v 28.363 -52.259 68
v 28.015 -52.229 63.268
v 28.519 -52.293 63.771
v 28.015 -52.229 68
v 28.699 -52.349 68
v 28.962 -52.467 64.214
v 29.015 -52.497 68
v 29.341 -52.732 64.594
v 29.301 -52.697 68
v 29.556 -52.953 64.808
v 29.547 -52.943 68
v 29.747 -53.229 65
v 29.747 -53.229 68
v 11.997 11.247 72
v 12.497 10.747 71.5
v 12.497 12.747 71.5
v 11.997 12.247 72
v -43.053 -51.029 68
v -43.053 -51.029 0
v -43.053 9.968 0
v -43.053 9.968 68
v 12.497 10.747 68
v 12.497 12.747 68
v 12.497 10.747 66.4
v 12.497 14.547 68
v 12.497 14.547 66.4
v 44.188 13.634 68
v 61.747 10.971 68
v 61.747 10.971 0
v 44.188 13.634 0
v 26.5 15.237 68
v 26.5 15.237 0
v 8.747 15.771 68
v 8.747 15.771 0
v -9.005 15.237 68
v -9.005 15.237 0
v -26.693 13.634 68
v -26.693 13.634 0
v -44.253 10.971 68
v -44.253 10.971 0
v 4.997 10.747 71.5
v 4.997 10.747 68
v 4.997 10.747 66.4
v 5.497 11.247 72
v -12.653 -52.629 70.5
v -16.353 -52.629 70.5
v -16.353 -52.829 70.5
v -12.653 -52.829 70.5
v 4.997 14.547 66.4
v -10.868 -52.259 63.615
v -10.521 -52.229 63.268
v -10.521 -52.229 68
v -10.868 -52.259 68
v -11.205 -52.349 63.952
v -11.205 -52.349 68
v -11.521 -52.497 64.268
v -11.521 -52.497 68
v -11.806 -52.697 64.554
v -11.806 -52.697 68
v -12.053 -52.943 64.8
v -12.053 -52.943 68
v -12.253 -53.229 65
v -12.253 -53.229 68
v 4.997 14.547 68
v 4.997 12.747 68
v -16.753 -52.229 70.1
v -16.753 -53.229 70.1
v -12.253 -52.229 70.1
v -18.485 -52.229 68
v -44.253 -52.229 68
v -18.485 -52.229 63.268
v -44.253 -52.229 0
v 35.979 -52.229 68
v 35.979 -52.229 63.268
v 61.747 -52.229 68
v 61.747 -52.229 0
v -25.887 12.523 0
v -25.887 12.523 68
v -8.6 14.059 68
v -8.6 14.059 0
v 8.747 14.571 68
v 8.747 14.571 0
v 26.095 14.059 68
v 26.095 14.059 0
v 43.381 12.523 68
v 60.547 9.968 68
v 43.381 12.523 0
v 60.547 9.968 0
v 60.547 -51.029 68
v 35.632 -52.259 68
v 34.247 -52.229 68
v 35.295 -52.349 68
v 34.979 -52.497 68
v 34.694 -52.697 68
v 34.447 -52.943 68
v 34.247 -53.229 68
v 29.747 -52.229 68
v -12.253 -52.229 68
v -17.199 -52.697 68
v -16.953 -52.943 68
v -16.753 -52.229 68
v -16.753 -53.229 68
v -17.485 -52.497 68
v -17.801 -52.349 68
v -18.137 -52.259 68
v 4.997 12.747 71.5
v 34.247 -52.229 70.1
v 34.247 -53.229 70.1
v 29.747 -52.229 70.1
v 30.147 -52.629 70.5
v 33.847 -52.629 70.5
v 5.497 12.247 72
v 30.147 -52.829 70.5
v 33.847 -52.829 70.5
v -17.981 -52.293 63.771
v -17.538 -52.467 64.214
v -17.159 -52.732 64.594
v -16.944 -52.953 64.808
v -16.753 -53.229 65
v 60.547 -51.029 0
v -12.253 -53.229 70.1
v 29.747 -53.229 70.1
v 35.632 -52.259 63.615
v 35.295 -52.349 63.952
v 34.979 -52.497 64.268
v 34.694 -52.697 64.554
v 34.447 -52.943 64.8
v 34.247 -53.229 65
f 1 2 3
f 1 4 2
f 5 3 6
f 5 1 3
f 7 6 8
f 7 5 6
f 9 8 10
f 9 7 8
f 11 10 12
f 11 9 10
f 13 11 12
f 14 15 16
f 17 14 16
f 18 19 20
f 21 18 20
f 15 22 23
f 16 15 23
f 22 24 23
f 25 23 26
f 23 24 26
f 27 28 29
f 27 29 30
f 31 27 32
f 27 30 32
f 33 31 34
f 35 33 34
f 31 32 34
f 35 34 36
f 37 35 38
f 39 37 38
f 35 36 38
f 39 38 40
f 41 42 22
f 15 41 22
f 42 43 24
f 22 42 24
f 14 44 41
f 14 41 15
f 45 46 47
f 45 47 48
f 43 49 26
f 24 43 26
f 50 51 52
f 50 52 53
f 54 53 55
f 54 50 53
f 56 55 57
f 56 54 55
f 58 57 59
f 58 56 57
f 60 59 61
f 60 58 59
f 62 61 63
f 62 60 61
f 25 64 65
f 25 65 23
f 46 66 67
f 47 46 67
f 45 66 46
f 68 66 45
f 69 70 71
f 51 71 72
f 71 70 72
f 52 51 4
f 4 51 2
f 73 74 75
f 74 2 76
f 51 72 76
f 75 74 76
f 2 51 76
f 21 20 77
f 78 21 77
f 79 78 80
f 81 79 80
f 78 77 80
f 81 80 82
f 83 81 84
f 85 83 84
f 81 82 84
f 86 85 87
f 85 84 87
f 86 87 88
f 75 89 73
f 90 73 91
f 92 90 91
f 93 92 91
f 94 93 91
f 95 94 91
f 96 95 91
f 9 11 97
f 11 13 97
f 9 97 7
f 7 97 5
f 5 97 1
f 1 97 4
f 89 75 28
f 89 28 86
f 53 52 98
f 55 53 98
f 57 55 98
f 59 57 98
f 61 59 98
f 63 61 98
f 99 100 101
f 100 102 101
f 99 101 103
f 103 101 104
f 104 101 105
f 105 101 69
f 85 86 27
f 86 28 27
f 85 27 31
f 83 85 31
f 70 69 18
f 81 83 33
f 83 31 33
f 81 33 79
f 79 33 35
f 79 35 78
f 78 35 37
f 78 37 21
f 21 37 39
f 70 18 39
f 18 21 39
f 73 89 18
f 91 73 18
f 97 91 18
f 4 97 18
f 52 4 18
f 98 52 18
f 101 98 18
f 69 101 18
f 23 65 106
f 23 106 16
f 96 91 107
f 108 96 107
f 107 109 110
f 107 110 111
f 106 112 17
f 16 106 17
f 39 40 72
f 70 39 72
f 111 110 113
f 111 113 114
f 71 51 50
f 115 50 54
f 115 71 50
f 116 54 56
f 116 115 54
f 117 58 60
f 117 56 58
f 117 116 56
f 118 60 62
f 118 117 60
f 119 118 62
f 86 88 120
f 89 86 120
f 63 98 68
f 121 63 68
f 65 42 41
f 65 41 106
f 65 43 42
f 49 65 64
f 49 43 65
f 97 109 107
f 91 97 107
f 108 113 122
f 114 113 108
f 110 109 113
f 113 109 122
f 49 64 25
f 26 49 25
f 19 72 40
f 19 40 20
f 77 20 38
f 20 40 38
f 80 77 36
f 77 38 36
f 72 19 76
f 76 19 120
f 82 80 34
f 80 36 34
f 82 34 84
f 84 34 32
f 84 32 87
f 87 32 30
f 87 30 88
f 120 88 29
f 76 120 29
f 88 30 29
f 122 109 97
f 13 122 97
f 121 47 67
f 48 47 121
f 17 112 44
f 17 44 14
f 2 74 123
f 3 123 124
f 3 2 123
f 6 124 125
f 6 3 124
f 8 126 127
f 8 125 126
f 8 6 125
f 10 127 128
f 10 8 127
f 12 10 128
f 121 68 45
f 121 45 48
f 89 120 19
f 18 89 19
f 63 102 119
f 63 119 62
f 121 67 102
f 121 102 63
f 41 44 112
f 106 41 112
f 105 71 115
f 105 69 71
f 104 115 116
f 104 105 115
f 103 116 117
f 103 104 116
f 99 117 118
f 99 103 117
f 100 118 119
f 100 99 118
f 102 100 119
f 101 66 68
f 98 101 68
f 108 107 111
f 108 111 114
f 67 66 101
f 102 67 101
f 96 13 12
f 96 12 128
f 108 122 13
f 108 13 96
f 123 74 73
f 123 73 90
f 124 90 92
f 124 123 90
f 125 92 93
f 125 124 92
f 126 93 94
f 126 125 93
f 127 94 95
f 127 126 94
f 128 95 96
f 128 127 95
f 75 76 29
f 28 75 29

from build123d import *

# Parameters (mm, degrees)
F1_DEPTH     = 68
F2_W         = 4.5
F2_H         = 2.5
F2_H_2       = 3
F3_DEPTH     = 1
F4_T1_DEPTH  = 3
F4_T3_DEPTH  = 4.5
F4_T5_DEPTH  = 4.5
F4_T11_DEPTH = 7.3301270189
F4_T15_DEPTH = 8.8301270189
F4_T22_DEPTH = 8.8301270189
F4_T26_DEPTH = 7.3301270189
F4_T33_DEPTH = 8.8301270189
F4_T37_DEPTH = 7.3301270189
F4_T44_DEPTH = 7.3301270189
F4_T48_DEPTH = 8.8301270189
F5_W         = 7.5
F5_H         = 3.8003136895
F6_DEPTH     = 1.6
F7_W         = 7.5
F7_H         = 2
F8_DEPTH     = 4
F9_SIZE      = 0.5
F10_SIZE     = 0.4


# Not quite as in the source:
# - a fillet or chamfer that OpenCascade refuses, or shapes differently, is made with other operations: its cross-section is extruded or revolved along the edge and cut away or added


with BuildPart() as f1:
    # F0 (on Top) → F1 (new body)
    with BuildSketch(Plane.XY):
        with BuildLine():
            ThreePointArc((61.7473262101, 10.9707194196), (8.7473262101, 15.7712320468), (-44.2526737899, 10.9707194196))
            Line((-44.2526737899, 10.9707194196), (-44.2526737899, -52.2287679532))
            Line((-44.2526737899, -52.2287679532), (61.7473262101, -52.2287679532))
            Line((61.7473262101, -52.2287679532), (61.7473262101, 10.9707194196))
        make_face()
        with BuildLine():
            ThreePointArc((-43.0526737899, 9.9683154894), (8.7473262101, 14.5712320468), (60.5473262101, 9.9683154894))
            Line((60.5473262101, 9.9683154894), (60.5473262101, -51.0287679532))
            Line((60.5473262101, -51.0287679532), (-43.0526737899, -51.0287679532))
            Line((-43.0526737899, -51.0287679532), (-43.0526737899, 9.9683154894))
        make_face(mode=Mode.SUBTRACT)
    extrude(amount=F1_DEPTH)

    # F2 (on face) → F3 (join)
    with BuildSketch(Plane.XZ.offset(52.2287679532)):
        with Locations((-14.5026737899, 69.25)):
            Rectangle(F2_W, F2_H)
        with Locations((31.9973262101, 69.25)):
            Rectangle(F2_W, F2_H)
        with Locations((-14.5026737899, 66.5)):
            Rectangle(F2_W, F2_H_2)
        with Locations((31.9973262101, 66.5)):
            Rectangle(F2_W, F2_H_2)
    extrude(amount=F3_DEPTH)

    # F4: fillet of radius 2 on 6 edges, made by hand

    # F4_s2 → F4_t1 (join)
    with BuildSketch(Plane.XY.offset(65)):
        with BuildLine():
            ThreePointArc((-10.5206229823, -52.2287679532), (-11.5206229823, -52.4967171456), (-12.2526737899, -53.2287679532))
            Line((-12.2526737899, -53.2287679532), (-12.2526737899, -52.2287679532))
            Line((-12.2526737899, -52.2287679532), (-10.5206229823, -52.2287679532))
        make_face()
        with BuildLine():
            ThreePointArc((-18.4847245974, -52.2287679532), (-17.4847245974, -52.4967171456), (-16.7526737899, -53.2287679532))
            Line((-16.7526737899, -53.2287679532), (-16.7526737899, -52.2287679532))
            Line((-16.7526737899, -52.2287679532), (-18.4847245974, -52.2287679532))
        make_face()
        with BuildLine():
            ThreePointArc((28.0152754026, -52.2287679532), (29.0152754026, -52.4967171456), (29.7473262101, -53.2287679532))
            Line((29.7473262101, -53.2287679532), (29.7473262101, -52.2287679532))
            Line((29.7473262101, -52.2287679532), (28.0152754026, -52.2287679532))
        make_face()
        with BuildLine():
            ThreePointArc((35.9793770177, -52.2287679532), (34.9793770177, -52.4967171456), (34.2473262101, -53.2287679532))
            Line((34.2473262101, -53.2287679532), (34.2473262101, -52.2287679532))
            Line((34.2473262101, -52.2287679532), (35.9793770177, -52.2287679532))
        make_face()
    extrude(amount=F4_T1_DEPTH)

    # F4_s4 → F4_t3 (join)
    with BuildSketch(Plane.YZ.offset(-16.7526737899)):
        with BuildLine():
            ThreePointArc((-52.2287679532, 63.2679491924), (-52.4967171456, 64.2679491924), (-53.2287679532, 65))
            Line((-53.2287679532, 65), (-52.2287679532, 65))
            Line((-52.2287679532, 65), (-52.2287679532, 63.2679491924))
        make_face()
    extrude(amount=F4_T3_DEPTH)

    # F4_s6 → F4_t5 (join)
    with BuildSketch(Plane.YZ.offset(29.7473262101)):
        with BuildLine():
            ThreePointArc((-52.2287679532, 63.2679491924), (-52.4967171456, 64.2679491924), (-53.2287679532, 65))
            Line((-53.2287679532, 65), (-52.2287679532, 65))
            Line((-52.2287679532, 65), (-52.2287679532, 63.2679491924))
        make_face()
    extrude(amount=F4_T5_DEPTH)


with BuildPart() as f4_tool9:
    # F4_s10 → F4_t11 (new body)
    with BuildSketch(Plane.XY.offset(60.6698729811)):
        with BuildLine():
            ThreePointArc((-10.5206229823, -52.2287679532), (-11.5206229823, -52.4967171456), (-12.2526737899, -53.2287679532))
            Line((-12.2526737899, -53.2287679532), (-12.2526737899, -52.2287679532))
            Line((-12.2526737899, -52.2287679532), (-10.5206229823, -52.2287679532))
        make_face()
    extrude(amount=F4_T11_DEPTH)

    split(bisect_by=Plane.XY.offset(65), keep=Keep.BOTTOM)


with BuildPart() as f4_tool13:
    # F4_s14 → F4_t15 (new body)
    with BuildSketch(Plane.YZ.offset(-16.7526737899)):
        with BuildLine():
            ThreePointArc((-52.2287679532, 63.2679491924), (-52.4967171456, 64.2679491924), (-53.2287679532, 65))
            Line((-53.2287679532, 65), (-52.2287679532, 65))
            Line((-52.2287679532, 65), (-52.2287679532, 63.2679491924))
        make_face()
    extrude(amount=F4_T15_DEPTH)

    split(bisect_by=Plane.YZ.offset(-12.2526737899), keep=Keep.TOP)


with BuildPart() as f4_tool9_1:
    add(f4_tool9.part)

    # F4_t17: intersect F4_tool13
    add(f4_tool13.part, mode=Mode.INTERSECT)


with BuildPart() as f1_1:
    add(f1.part)

    # F4_t7: union F4_tool9
    add(f4_tool9_1.part)


with BuildPart() as f4_tool20:
    # F4_s21 → F4_t22 (new body)
    with BuildSketch(Plane.YZ.offset(-21.0828008088)):
        with BuildLine():
            ThreePointArc((-52.2287679532, 63.2679491924), (-52.4967171456, 64.2679491924), (-53.2287679532, 65))
            Line((-53.2287679532, 65), (-52.2287679532, 65))
            Line((-52.2287679532, 65), (-52.2287679532, 63.2679491924))
        make_face()
    extrude(amount=F4_T22_DEPTH)

    split(bisect_by=Plane.YZ.offset(-16.7526737899), keep=Keep.BOTTOM)


with BuildPart() as f4_tool24:
    # F4_s25 → F4_t26 (new body)
    with BuildSketch(Plane.XY.offset(68)):
        with BuildLine():
            ThreePointArc((-18.4847245974, -52.2287679532), (-17.4847245974, -52.4967171456), (-16.7526737899, -53.2287679532))
            Line((-16.7526737899, -53.2287679532), (-16.7526737899, -52.2287679532))
            Line((-16.7526737899, -52.2287679532), (-18.4847245974, -52.2287679532))
        make_face()
    extrude(amount=-F4_T26_DEPTH)

    split(bisect_by=Plane.XY.offset(65), keep=Keep.BOTTOM)


with BuildPart() as f4_tool20_1:
    add(f4_tool20.part)

    # F4_t28: intersect F4_tool24
    add(f4_tool24.part, mode=Mode.INTERSECT)


with BuildPart() as f1_2:
    add(f1_1.part)

    # F4_t18: union F4_tool20
    add(f4_tool20_1.part)


with BuildPart() as f4_tool31:
    # F4_s32 → F4_t33 (new body)
    with BuildSketch(Plane.YZ.offset(25.4171991912)):
        with BuildLine():
            ThreePointArc((-52.2287679532, 63.2679491924), (-52.4967171456, 64.2679491924), (-53.2287679532, 65))
            Line((-53.2287679532, 65), (-52.2287679532, 65))
            Line((-52.2287679532, 65), (-52.2287679532, 63.2679491924))
        make_face()
    extrude(amount=F4_T33_DEPTH)

    split(bisect_by=Plane.YZ.offset(29.7473262101), keep=Keep.BOTTOM)


with BuildPart() as f4_tool35:
    # F4_s36 → F4_t37 (new body)
    with BuildSketch(Plane.XY.offset(68)):
        with BuildLine():
            ThreePointArc((28.0152754026, -52.2287679532), (29.0152754026, -52.4967171456), (29.7473262101, -53.2287679532))
            Line((29.7473262101, -53.2287679532), (29.7473262101, -52.2287679532))
            Line((29.7473262101, -52.2287679532), (28.0152754026, -52.2287679532))
        make_face()
    extrude(amount=-F4_T37_DEPTH)

    split(bisect_by=Plane.XY.offset(65), keep=Keep.BOTTOM)


with BuildPart() as f4_tool31_1:
    add(f4_tool31.part)

    # F4_t39: intersect F4_tool35
    add(f4_tool35.part, mode=Mode.INTERSECT)


with BuildPart() as f1_3:
    add(f1_2.part)

    # F4_t29: union F4_tool31
    add(f4_tool31_1.part)


with BuildPart() as f4_tool42:
    # F4_s43 → F4_t44 (new body)
    with BuildSketch(Plane.XY.offset(60.6698729811)):
        with BuildLine():
            ThreePointArc((35.9793770177, -52.2287679532), (34.9793770177, -52.4967171456), (34.2473262101, -53.2287679532))
            Line((34.2473262101, -53.2287679532), (34.2473262101, -52.2287679532))
            Line((34.2473262101, -52.2287679532), (35.9793770177, -52.2287679532))
        make_face()
    extrude(amount=F4_T44_DEPTH)

    split(bisect_by=Plane.XY.offset(65), keep=Keep.BOTTOM)


with BuildPart() as f4_tool46:
    # F4_s47 → F4_t48 (new body)
    with BuildSketch(Plane.YZ.offset(29.7473262101)):
        with BuildLine():
            ThreePointArc((-52.2287679532, 63.2679491924), (-52.4967171456, 64.2679491924), (-53.2287679532, 65))
            Line((-53.2287679532, 65), (-52.2287679532, 65))
            Line((-52.2287679532, 65), (-52.2287679532, 63.2679491924))
        make_face()
    extrude(amount=F4_T48_DEPTH)

    split(bisect_by=Plane.YZ.offset(34.2473262101), keep=Keep.TOP)


with BuildPart() as f4_tool42_1:
    add(f4_tool42.part)

    # F4_t50: intersect F4_tool46
    add(f4_tool46.part, mode=Mode.INTERSECT)


with BuildPart() as f1_4:
    add(f1_3.part)

    # F4_t40: union F4_tool42
    add(f4_tool42_1.part)

    # F10
    f10_edges = [f1_4.edges().sort_by_distance(p)[0] for p in [
        (31.997326, -52.228768, 70.5),
        (29.747326, -52.728768, 70.5),
        (31.997326, -53.228768, 70.5),
        (34.247326, -52.728768, 70.5),
        (-14.502674, -52.228768, 70.5),
        (-16.752674, -52.728768, 70.5),
        (-12.252674, -52.728768, 70.5),
        (-14.502674, -53.228768, 70.5),
    ]]
    chamfer(f10_edges, length=F10_SIZE)


with BuildPart() as f6:
    # F5 (on face) → F6 (new body)
    with BuildSketch(Plane.XY.offset(68)):
        with Locations((8.7473262101, 12.6471399452)):
            Rectangle(F5_W, F5_H)
    extrude(amount=-F6_DEPTH)

    # F7 (on face) → F8 (join)
    with BuildSketch(Plane.XY.offset(68)):
        with Locations((8.7473262101, 11.7469831005)):
            Rectangle(F7_W, F7_H)
    extrude(amount=F8_DEPTH)

    # F9
    f9_edges = [f6.edges().sort_by_distance(p)[0] for p in [
        (4.997326, 11.746983, 72),
        (8.747326, 10.746983, 72),
        (8.747326, 12.746983, 72),
        (12.497326, 11.746983, 72),
    ]]
    chamfer(f9_edges, length=F9_SIZE)


solid = Compound([f1_4.part, f6.part])
